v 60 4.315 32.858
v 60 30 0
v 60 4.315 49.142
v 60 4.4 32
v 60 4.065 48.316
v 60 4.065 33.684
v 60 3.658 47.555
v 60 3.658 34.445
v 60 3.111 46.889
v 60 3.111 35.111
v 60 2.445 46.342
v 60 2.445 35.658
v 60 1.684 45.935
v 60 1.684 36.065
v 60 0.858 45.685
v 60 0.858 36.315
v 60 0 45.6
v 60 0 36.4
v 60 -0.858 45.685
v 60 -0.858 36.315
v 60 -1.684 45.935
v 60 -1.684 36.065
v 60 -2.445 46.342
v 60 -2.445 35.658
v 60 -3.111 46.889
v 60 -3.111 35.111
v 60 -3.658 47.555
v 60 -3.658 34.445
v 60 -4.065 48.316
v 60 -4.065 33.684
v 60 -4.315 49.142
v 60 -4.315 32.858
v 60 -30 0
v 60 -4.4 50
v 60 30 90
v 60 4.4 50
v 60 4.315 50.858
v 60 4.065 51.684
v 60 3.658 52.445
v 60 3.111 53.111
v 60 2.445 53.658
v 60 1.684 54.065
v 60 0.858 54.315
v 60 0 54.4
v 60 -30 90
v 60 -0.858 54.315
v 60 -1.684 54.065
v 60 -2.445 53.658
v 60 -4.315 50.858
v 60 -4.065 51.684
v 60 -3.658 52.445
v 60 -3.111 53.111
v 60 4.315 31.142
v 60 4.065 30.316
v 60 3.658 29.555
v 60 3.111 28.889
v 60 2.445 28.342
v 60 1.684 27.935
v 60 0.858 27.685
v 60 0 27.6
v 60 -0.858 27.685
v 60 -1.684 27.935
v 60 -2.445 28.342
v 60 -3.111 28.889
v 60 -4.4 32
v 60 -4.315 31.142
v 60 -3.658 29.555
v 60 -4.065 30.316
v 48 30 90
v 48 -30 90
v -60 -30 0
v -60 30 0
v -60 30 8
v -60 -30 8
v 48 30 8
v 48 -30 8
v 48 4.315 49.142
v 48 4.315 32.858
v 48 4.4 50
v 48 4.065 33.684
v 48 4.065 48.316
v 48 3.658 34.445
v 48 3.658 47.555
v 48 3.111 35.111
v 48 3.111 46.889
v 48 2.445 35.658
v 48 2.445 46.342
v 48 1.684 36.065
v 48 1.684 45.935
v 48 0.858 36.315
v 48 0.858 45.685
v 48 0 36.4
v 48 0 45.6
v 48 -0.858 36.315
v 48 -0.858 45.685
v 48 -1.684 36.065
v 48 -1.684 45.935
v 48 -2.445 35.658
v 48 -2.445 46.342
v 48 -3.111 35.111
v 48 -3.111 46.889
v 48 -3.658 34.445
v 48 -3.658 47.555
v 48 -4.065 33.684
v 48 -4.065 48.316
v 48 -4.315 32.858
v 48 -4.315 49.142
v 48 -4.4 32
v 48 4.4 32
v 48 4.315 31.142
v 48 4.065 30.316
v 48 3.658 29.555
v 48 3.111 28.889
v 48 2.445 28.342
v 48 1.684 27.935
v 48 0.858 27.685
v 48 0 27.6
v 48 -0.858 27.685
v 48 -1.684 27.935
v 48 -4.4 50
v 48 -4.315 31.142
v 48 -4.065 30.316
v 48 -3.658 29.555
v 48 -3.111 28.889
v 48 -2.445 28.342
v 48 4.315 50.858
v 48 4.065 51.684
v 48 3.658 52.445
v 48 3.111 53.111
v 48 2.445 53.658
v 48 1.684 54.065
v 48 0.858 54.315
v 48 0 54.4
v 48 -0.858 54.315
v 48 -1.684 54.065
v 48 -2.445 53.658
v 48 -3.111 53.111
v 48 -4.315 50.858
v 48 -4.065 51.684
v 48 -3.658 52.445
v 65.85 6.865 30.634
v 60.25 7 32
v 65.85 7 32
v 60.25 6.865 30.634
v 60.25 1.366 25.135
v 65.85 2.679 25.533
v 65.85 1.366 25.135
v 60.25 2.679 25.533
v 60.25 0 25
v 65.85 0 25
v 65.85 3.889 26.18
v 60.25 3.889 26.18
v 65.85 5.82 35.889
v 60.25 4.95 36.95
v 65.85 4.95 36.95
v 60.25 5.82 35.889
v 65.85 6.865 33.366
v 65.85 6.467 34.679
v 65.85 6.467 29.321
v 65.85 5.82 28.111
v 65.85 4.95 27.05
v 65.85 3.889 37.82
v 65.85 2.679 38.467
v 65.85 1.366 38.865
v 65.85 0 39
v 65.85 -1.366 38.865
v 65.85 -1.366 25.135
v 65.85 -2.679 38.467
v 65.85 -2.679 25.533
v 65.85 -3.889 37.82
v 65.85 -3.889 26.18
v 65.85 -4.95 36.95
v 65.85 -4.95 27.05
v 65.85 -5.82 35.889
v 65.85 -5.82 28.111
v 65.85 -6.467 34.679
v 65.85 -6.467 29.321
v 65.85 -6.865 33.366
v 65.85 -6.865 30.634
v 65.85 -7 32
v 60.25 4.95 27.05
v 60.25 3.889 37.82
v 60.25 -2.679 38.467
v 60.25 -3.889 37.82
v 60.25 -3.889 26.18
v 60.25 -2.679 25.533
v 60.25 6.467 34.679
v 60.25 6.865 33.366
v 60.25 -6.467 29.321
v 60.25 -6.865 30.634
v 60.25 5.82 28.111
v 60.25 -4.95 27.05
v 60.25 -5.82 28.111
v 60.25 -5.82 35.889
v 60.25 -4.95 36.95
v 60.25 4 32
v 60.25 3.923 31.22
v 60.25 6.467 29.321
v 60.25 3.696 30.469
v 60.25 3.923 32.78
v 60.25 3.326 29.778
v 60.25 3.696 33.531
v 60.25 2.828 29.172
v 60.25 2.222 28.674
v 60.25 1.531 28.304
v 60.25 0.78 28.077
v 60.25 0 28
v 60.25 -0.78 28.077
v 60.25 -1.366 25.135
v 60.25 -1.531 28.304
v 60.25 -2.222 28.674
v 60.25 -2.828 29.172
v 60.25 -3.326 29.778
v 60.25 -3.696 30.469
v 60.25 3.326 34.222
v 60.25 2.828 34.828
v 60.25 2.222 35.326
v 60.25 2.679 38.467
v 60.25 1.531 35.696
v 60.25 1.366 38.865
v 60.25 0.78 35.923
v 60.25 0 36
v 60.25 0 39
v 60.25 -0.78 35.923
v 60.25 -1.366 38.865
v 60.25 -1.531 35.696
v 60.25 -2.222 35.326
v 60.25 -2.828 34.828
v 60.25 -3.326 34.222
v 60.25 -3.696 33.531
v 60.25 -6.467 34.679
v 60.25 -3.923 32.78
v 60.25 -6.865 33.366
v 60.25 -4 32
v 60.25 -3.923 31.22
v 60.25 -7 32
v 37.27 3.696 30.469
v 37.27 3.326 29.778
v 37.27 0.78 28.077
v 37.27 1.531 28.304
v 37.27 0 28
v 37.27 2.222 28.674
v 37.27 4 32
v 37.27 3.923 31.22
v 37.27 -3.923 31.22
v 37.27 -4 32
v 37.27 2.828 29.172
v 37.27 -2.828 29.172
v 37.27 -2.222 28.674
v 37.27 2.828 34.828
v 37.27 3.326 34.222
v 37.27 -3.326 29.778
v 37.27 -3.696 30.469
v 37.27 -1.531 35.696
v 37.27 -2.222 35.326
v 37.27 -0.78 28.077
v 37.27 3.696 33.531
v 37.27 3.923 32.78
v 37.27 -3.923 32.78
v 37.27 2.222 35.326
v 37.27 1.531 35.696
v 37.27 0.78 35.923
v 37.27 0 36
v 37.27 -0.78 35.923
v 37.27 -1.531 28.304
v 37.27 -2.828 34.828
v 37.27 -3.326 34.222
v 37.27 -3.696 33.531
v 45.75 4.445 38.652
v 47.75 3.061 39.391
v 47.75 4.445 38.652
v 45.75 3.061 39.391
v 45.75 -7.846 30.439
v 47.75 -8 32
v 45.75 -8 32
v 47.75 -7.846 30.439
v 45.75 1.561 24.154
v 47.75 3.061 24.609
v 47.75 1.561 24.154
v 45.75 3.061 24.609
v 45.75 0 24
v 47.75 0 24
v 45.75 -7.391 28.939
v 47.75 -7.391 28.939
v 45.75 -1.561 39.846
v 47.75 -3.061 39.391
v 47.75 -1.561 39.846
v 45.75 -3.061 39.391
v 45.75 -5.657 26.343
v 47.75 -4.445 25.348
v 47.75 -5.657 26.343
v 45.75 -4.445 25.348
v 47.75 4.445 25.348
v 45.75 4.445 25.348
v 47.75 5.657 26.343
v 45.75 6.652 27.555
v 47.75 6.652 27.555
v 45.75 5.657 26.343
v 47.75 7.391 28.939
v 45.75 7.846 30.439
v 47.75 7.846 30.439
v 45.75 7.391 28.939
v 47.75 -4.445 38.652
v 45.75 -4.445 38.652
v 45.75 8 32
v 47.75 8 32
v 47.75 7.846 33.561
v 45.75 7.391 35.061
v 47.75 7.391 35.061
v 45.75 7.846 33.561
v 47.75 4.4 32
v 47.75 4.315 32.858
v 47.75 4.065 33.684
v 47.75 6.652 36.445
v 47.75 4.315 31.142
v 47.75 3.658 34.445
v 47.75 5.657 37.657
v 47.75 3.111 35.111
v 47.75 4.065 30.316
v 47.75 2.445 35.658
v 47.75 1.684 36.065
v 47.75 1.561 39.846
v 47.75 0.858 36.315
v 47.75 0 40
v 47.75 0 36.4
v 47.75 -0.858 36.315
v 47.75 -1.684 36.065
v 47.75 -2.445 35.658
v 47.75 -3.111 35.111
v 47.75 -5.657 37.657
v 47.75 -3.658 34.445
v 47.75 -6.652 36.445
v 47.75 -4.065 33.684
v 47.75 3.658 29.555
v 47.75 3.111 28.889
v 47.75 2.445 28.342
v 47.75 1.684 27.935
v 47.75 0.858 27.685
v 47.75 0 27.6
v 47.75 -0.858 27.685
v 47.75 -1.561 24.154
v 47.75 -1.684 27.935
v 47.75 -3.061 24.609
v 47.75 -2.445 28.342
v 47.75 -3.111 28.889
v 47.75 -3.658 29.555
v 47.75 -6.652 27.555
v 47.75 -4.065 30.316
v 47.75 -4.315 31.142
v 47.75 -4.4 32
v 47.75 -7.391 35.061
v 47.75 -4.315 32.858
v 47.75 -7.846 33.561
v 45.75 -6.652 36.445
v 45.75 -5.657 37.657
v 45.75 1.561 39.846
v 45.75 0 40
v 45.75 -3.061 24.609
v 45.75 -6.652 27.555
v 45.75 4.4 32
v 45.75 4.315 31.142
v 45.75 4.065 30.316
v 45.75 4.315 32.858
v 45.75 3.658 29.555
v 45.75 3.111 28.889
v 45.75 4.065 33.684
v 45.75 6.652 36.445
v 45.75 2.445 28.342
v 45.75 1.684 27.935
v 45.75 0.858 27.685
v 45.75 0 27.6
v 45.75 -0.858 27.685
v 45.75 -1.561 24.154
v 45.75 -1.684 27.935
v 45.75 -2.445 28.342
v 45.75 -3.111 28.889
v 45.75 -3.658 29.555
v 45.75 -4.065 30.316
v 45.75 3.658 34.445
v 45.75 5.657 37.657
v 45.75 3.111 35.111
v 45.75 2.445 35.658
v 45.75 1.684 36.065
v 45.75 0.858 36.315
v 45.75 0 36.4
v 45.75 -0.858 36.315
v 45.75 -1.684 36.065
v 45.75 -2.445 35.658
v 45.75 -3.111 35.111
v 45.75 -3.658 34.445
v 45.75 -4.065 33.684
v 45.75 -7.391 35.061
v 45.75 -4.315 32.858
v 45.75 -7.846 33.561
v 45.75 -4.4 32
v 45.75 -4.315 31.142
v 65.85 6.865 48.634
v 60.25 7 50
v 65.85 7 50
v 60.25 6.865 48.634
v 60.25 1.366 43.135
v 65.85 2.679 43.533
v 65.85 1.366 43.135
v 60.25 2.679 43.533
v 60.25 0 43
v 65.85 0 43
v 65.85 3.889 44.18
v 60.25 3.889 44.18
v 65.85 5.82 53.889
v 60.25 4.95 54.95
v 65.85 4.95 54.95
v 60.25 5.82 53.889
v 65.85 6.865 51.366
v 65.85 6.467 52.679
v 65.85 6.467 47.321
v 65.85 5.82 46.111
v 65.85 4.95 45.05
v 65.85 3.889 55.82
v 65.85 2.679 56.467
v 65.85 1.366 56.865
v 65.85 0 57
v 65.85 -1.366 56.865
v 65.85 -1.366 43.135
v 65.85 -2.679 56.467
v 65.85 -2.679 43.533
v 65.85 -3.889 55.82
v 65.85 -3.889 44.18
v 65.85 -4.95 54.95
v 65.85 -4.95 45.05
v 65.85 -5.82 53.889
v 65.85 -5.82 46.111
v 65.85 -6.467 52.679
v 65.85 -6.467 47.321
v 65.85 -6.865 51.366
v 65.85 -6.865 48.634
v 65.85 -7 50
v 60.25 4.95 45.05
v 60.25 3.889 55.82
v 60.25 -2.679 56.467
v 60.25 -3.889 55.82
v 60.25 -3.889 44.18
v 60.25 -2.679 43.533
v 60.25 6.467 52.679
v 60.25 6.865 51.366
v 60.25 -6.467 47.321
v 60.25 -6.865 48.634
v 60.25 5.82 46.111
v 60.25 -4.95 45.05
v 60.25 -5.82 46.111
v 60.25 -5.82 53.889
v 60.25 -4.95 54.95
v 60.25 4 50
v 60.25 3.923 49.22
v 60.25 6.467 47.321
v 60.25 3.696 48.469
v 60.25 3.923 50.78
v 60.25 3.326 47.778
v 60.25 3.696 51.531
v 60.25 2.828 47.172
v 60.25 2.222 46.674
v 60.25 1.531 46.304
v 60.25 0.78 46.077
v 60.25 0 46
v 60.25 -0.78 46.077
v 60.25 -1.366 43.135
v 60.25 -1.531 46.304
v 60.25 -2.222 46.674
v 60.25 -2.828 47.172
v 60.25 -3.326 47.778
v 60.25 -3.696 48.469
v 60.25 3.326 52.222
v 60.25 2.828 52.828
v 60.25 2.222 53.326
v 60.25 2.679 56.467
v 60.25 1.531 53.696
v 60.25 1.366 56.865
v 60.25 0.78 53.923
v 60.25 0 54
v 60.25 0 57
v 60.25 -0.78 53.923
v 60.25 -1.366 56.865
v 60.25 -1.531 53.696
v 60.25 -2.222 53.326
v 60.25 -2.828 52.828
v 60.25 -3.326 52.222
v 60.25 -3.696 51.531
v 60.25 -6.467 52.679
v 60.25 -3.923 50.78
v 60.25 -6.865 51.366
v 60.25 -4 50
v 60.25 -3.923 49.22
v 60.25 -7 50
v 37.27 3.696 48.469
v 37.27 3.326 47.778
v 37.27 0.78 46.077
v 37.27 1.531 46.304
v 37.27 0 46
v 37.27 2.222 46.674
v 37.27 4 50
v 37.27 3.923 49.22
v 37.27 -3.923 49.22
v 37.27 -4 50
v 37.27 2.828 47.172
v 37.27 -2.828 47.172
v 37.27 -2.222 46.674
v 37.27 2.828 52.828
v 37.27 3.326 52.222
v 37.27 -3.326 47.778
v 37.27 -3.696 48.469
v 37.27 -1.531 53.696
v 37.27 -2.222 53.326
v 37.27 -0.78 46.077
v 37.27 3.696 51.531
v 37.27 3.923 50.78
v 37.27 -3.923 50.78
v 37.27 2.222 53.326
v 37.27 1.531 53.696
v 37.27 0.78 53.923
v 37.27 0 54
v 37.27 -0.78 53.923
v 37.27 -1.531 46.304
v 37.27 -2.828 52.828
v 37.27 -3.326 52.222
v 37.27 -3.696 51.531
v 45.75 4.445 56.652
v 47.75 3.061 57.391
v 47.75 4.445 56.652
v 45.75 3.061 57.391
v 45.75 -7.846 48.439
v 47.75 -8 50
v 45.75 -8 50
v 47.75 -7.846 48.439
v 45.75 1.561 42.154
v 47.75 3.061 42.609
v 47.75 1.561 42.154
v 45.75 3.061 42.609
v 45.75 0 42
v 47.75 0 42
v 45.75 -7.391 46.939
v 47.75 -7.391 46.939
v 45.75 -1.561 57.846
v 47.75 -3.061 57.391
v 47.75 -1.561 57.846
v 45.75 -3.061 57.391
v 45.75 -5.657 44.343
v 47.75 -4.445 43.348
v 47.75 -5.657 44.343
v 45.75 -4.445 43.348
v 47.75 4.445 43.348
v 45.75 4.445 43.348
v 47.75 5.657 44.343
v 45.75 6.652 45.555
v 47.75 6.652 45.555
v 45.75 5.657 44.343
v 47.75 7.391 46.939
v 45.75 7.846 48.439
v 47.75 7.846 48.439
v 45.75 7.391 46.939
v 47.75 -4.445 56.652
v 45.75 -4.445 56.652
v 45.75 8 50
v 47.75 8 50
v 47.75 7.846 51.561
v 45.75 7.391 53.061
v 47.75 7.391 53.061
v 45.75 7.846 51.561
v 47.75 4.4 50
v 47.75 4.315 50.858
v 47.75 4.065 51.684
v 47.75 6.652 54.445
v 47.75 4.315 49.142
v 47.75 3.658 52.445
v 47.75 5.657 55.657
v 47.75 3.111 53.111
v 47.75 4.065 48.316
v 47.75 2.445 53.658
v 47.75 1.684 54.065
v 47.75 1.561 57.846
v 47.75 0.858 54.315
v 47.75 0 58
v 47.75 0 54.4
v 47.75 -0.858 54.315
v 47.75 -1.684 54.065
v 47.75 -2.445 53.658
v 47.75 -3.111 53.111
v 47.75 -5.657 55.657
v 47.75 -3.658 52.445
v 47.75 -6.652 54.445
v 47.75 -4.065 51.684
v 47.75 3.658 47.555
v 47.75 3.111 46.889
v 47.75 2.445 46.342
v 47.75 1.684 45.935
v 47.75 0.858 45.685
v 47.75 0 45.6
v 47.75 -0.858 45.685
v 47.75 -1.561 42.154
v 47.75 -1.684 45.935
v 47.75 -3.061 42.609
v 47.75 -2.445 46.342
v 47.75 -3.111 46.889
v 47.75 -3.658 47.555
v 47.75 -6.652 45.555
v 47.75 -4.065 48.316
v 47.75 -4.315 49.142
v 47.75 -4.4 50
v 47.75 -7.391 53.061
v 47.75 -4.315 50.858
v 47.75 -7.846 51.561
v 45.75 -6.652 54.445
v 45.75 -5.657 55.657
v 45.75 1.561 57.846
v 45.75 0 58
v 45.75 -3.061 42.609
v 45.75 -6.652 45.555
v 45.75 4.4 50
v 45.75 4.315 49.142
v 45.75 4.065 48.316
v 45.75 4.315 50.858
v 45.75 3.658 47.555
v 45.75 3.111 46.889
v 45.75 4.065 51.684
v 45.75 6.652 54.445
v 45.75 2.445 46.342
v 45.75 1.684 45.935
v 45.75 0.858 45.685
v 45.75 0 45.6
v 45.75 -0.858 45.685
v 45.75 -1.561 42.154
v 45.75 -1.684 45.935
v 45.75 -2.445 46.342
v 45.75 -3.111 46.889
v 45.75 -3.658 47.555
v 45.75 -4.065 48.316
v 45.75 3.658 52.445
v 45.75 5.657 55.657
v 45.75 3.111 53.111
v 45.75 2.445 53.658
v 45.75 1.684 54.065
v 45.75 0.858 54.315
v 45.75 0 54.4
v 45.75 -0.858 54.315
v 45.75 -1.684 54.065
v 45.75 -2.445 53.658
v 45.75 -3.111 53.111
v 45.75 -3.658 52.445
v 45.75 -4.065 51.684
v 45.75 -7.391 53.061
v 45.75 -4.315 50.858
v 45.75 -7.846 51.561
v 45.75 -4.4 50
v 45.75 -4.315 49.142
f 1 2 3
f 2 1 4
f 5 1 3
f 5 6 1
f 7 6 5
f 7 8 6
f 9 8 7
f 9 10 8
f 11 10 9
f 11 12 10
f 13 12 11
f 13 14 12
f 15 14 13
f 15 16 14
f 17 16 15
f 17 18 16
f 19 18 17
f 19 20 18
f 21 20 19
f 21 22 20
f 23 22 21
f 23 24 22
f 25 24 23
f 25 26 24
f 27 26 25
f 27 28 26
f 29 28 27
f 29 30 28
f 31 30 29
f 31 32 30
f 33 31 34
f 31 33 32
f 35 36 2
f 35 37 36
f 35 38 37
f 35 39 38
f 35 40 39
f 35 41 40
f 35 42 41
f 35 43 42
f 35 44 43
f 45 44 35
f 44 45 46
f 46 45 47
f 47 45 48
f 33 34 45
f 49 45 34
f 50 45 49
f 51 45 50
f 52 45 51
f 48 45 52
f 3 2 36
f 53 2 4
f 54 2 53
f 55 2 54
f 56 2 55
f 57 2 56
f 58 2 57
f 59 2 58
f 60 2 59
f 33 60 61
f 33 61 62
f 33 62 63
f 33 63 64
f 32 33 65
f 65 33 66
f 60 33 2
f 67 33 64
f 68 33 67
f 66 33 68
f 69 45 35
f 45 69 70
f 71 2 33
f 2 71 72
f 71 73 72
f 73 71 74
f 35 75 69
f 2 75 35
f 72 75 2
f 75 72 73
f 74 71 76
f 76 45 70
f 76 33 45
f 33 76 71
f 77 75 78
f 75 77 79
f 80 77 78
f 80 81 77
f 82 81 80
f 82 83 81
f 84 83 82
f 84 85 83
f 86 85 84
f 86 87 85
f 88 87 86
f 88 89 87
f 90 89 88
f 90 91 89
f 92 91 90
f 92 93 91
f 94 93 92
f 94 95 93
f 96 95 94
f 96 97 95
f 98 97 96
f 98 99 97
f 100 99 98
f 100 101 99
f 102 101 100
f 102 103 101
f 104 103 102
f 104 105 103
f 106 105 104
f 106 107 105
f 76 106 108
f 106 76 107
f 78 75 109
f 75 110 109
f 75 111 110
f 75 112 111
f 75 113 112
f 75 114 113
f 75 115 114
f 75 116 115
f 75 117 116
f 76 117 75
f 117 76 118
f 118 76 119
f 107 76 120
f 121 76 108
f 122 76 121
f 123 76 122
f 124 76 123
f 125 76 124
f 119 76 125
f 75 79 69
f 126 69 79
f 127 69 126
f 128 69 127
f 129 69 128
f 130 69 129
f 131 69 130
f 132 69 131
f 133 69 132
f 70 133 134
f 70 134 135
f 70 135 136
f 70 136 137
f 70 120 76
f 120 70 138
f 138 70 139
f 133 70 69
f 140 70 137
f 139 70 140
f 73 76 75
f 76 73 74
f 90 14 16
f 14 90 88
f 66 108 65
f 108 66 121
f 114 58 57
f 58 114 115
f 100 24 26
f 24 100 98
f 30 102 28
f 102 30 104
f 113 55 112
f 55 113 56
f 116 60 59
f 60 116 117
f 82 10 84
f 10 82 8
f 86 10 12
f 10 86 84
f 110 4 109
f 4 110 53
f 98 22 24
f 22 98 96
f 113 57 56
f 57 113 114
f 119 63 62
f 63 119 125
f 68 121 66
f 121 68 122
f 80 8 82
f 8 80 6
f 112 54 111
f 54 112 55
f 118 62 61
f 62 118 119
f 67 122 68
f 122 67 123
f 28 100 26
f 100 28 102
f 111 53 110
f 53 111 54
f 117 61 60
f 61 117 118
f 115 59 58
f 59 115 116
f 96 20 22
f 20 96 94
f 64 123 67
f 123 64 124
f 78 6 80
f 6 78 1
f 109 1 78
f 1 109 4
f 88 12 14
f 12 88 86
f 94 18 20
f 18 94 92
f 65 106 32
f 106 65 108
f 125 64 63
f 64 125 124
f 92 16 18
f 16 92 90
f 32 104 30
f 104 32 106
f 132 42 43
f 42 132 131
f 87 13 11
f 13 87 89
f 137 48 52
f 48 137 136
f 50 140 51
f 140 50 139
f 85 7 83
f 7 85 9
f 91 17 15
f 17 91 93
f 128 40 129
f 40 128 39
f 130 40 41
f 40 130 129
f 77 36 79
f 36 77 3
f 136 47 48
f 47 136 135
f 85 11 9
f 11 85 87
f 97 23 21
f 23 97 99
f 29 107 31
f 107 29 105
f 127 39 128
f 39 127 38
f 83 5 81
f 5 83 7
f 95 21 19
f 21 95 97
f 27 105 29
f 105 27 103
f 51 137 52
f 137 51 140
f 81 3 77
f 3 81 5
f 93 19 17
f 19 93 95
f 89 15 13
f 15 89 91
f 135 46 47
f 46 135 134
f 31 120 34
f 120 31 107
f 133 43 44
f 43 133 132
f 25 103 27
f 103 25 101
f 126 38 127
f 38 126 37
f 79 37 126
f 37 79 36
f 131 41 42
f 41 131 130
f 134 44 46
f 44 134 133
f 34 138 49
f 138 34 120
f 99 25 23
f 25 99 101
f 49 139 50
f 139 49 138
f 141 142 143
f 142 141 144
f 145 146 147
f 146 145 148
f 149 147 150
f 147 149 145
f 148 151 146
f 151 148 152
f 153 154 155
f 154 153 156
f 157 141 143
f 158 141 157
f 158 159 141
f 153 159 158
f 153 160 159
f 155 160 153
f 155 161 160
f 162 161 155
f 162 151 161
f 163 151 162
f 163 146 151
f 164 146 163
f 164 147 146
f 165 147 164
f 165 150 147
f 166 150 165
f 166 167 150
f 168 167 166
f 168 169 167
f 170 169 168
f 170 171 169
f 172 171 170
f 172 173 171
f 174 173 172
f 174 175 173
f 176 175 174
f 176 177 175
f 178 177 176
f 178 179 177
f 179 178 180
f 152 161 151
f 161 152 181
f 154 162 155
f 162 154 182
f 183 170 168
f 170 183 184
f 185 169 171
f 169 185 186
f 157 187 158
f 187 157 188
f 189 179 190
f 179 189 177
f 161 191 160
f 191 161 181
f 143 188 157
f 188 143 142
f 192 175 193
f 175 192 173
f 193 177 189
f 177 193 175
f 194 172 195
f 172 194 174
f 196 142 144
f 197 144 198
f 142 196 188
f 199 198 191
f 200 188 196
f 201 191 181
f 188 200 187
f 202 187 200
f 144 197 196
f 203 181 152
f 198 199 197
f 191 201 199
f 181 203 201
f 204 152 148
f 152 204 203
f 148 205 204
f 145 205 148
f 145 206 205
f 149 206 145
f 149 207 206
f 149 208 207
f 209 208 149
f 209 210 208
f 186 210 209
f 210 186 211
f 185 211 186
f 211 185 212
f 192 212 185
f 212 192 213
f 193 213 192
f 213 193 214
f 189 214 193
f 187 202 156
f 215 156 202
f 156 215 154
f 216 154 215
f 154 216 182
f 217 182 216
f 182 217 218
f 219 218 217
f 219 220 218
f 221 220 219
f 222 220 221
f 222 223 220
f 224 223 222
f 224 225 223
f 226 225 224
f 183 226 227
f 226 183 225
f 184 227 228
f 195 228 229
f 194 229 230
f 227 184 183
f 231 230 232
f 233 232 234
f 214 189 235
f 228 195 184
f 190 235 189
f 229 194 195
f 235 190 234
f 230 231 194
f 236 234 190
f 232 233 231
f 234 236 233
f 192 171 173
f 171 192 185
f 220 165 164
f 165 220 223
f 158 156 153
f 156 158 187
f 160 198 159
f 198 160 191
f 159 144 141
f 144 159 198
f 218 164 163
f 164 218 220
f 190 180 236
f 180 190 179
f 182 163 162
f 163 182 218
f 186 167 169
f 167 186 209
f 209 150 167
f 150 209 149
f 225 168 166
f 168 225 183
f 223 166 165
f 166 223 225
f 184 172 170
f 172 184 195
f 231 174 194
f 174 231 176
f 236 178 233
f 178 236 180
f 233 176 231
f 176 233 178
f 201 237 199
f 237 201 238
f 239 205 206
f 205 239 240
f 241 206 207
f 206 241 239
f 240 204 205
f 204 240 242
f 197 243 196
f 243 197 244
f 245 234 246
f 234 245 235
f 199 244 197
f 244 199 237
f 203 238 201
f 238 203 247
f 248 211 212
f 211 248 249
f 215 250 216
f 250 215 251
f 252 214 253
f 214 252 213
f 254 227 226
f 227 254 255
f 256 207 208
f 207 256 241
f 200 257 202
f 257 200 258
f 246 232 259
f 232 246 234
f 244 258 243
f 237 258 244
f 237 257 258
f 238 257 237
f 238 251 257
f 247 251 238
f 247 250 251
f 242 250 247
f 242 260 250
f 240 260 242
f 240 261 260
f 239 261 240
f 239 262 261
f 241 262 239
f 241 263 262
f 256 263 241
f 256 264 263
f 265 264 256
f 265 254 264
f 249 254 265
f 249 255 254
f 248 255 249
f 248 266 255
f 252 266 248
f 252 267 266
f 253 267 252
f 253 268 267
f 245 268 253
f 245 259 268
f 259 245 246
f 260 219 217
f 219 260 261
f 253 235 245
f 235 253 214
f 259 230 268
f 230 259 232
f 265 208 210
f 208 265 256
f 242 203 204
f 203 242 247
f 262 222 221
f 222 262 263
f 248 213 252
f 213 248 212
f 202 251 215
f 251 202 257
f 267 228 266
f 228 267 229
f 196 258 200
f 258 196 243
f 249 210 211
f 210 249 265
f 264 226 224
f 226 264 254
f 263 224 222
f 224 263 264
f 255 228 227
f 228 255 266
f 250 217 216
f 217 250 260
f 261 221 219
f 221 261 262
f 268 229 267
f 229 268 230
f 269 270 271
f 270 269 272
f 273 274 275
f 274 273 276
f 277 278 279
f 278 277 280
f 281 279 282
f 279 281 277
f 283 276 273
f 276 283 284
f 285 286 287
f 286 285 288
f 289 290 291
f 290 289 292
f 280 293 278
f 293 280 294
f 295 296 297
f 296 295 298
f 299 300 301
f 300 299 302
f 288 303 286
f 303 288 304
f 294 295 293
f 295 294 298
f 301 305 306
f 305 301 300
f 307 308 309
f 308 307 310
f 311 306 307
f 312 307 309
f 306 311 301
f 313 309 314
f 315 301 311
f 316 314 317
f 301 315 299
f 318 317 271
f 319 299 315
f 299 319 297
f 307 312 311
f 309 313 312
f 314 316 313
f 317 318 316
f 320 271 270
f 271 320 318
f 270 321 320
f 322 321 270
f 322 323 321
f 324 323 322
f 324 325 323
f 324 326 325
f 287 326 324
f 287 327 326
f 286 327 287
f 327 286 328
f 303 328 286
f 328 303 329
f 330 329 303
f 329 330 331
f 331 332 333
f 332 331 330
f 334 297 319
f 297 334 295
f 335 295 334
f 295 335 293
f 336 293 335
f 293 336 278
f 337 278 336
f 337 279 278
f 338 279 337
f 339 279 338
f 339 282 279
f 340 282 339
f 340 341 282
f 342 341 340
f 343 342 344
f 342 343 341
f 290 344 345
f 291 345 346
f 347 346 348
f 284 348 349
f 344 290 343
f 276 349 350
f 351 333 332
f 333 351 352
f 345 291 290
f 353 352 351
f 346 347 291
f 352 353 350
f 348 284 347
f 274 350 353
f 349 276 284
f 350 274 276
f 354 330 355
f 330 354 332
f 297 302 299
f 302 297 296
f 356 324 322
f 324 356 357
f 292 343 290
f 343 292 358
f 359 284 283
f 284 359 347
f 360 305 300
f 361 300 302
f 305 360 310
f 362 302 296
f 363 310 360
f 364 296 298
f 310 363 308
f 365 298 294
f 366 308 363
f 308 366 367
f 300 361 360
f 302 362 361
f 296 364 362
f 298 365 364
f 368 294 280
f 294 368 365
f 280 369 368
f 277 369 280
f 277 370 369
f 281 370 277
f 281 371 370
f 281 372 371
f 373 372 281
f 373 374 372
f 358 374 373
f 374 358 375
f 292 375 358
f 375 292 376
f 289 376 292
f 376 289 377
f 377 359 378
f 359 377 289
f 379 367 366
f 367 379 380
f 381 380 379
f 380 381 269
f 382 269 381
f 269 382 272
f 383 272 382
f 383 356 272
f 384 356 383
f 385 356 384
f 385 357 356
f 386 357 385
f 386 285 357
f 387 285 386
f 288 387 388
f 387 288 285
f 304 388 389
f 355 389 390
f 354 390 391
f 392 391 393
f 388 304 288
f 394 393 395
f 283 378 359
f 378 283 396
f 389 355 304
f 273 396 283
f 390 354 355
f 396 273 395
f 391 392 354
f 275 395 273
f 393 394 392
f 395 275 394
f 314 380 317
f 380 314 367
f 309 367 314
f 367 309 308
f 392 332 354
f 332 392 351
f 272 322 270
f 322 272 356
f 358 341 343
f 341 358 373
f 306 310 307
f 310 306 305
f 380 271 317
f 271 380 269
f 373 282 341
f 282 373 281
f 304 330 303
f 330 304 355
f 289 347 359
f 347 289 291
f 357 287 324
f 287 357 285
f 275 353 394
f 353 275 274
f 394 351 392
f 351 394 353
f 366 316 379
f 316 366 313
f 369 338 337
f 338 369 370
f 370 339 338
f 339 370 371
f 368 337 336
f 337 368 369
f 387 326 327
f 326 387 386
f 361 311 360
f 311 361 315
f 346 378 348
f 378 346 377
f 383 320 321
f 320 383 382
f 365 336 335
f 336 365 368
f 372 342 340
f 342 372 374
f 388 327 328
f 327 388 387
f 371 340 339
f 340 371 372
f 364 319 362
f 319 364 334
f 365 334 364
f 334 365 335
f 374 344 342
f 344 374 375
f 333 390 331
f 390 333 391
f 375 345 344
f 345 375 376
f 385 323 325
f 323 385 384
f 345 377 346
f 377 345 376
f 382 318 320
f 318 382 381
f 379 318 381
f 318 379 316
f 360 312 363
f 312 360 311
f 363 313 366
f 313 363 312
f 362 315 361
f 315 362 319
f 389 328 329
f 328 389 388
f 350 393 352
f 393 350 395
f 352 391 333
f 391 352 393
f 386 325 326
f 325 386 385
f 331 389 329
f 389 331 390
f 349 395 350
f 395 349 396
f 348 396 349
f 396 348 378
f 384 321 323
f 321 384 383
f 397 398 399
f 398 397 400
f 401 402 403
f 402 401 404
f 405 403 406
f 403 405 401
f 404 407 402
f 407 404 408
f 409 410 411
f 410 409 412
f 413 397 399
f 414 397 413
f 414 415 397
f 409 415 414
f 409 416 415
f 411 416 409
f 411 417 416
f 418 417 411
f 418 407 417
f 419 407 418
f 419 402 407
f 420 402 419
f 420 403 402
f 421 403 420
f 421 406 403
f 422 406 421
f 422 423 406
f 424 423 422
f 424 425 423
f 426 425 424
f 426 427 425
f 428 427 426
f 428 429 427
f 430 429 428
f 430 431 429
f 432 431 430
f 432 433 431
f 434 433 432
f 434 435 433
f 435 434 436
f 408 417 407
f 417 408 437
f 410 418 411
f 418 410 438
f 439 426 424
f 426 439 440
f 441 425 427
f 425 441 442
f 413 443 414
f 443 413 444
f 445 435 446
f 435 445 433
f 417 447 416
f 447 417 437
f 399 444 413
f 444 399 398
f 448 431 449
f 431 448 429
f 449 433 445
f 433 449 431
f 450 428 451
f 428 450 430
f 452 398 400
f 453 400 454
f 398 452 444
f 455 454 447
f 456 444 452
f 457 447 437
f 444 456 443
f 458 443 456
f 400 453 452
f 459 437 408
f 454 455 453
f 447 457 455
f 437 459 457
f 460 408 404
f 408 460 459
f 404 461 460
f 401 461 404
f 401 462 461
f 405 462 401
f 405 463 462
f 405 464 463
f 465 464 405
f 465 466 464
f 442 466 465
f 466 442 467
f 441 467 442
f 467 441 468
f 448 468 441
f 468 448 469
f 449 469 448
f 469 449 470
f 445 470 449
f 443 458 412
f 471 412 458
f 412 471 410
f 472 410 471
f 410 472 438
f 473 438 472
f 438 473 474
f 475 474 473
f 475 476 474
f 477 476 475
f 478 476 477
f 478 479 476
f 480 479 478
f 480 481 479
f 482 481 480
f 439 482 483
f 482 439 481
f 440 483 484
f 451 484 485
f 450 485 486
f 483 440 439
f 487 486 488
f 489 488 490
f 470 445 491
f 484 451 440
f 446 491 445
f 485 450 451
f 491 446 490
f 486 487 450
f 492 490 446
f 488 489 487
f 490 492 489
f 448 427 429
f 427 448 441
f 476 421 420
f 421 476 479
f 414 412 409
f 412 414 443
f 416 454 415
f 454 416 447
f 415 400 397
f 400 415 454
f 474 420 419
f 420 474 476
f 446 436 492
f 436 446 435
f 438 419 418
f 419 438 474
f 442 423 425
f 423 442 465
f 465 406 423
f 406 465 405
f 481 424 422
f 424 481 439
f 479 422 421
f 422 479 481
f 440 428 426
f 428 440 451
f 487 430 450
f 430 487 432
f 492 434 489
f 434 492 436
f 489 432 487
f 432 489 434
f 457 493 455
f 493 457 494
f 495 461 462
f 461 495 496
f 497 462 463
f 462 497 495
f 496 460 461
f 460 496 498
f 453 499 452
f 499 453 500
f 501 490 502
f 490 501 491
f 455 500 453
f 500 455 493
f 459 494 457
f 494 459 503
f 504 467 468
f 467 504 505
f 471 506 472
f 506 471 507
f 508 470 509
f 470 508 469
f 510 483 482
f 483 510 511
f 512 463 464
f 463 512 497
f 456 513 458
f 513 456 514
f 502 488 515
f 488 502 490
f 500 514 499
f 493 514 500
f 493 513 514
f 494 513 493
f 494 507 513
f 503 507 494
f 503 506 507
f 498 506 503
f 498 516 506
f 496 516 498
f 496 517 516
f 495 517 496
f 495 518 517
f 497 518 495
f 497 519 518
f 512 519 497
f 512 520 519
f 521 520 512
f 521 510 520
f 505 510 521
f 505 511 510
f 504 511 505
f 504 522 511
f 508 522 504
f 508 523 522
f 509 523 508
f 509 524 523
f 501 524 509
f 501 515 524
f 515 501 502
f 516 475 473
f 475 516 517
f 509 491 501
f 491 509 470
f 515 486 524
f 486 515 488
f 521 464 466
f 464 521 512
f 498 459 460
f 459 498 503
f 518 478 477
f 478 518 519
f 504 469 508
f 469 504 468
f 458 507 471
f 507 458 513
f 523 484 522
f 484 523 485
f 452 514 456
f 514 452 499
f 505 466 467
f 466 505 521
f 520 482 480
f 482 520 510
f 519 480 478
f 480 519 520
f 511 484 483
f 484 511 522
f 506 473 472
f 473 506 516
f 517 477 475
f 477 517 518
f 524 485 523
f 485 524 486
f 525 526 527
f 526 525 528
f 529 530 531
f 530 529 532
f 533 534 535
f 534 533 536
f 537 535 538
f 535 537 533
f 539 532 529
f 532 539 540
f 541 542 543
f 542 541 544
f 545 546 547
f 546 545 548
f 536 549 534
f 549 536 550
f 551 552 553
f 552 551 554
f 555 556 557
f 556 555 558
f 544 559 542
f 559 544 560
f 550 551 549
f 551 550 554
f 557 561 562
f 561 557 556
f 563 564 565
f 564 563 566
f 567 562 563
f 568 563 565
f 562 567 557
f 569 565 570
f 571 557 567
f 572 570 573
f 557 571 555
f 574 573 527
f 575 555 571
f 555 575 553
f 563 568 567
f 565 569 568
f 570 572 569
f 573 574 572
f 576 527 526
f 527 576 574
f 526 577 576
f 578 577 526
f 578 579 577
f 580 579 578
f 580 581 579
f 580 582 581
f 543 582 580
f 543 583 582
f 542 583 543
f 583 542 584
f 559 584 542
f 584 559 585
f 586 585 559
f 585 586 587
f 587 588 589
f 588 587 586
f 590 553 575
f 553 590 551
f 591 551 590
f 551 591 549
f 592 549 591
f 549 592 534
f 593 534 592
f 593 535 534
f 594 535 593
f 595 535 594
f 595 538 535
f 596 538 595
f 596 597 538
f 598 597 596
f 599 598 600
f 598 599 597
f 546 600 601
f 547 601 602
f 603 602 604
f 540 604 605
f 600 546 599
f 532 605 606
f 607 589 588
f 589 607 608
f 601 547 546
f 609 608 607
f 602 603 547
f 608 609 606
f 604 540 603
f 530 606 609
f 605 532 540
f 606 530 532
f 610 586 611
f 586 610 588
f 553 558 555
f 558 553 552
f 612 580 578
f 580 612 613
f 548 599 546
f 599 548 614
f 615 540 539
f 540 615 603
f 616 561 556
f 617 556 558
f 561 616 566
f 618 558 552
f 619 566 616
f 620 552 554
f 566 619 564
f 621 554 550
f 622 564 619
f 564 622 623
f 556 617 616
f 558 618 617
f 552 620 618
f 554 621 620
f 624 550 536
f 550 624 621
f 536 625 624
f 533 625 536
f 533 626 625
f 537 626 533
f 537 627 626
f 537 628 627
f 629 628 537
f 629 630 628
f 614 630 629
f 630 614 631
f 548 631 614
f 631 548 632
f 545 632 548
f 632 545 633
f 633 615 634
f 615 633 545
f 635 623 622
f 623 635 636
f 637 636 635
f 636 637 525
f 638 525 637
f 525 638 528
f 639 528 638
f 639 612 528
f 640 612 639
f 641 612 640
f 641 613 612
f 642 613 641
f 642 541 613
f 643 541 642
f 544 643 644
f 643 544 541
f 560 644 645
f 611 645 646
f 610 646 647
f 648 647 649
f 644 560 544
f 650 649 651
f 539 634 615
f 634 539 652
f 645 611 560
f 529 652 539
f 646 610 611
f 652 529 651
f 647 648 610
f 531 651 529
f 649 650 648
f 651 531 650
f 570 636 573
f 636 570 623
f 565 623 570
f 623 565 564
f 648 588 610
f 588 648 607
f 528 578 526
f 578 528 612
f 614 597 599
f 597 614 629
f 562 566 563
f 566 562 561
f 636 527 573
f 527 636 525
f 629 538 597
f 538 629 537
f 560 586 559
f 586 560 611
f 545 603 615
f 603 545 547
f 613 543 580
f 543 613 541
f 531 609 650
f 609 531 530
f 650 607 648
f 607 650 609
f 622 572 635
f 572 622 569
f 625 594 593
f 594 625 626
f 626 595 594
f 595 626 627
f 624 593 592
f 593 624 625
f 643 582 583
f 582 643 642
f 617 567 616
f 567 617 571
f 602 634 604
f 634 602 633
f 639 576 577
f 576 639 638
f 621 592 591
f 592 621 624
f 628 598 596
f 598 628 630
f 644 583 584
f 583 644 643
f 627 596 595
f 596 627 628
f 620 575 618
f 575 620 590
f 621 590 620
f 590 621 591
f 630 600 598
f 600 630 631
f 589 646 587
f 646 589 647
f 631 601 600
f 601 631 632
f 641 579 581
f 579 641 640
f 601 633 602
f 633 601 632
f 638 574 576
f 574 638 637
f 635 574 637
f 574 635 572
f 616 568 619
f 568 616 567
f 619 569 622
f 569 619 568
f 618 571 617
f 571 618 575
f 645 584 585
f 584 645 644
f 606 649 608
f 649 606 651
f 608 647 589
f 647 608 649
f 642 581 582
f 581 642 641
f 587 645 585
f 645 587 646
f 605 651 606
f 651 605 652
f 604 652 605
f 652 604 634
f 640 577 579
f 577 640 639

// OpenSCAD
$fn = 32;

// ------------------------------------------------------------------------
// Bolted bracket: 120 x 60 mm bracket with 2 bolt joints
// Every part is its own module, assembly() places them once.
// ------------------------------------------------------------------------

// --- part 1 ---
module bracket() {
  difference() {
    translate([-60, -30, 0]) cube([120, 60, 90]);
    translate([-61, -31, 8]) cube([109, 62, 83]);
    translate([54, 0, 32]) rotate([0, 90, 0]) cylinder(h = 14, d = 8.8, center = true);
    translate([54, 0, 50]) rotate([0, 90, 0]) cylinder(h = 14, d = 8.8, center = true);
  }
}

// --- part 2 ---
module bolt1() {
  cylinder(h = 5.6, d = 14);
  translate([0, 0, -22.98]) cylinder(h = 22.98, d = 8);
}

// --- part 3 ---
module washer1() {
  difference() {
      translate([0, 0, 0]) cylinder(h = 2, d = 16);
      translate([0, 0, -1]) cylinder(h = 4, d = 8.8);
    }
}

// --- part 4 ---
module bolt2() {
  cylinder(h = 5.6, d = 14);
  translate([0, 0, -22.98]) cylinder(h = 22.98, d = 8);
}

// --- part 5 ---
module washer2() {
  difference() {
      translate([0, 0, 0]) cylinder(h = 2, d = 16);
      translate([0, 0, -1]) cylinder(h = 4, d = 8.8);
    }
}

// --- assembly ---
module assembly() {
  translate([0, 0, 0]) rotate([0, 0, 0]) bracket();
  translate([60.25, 0, 32]) rotate([0, 90, 0]) bolt1();
  translate([45.75, 0, 32]) rotate([0, 90, 0]) washer1();
  translate([60.25, 0, 50]) rotate([0, 90, 0]) bolt2();
  translate([45.75, 0, 50]) rotate([0, 90, 0]) washer2();
}

assembly();
